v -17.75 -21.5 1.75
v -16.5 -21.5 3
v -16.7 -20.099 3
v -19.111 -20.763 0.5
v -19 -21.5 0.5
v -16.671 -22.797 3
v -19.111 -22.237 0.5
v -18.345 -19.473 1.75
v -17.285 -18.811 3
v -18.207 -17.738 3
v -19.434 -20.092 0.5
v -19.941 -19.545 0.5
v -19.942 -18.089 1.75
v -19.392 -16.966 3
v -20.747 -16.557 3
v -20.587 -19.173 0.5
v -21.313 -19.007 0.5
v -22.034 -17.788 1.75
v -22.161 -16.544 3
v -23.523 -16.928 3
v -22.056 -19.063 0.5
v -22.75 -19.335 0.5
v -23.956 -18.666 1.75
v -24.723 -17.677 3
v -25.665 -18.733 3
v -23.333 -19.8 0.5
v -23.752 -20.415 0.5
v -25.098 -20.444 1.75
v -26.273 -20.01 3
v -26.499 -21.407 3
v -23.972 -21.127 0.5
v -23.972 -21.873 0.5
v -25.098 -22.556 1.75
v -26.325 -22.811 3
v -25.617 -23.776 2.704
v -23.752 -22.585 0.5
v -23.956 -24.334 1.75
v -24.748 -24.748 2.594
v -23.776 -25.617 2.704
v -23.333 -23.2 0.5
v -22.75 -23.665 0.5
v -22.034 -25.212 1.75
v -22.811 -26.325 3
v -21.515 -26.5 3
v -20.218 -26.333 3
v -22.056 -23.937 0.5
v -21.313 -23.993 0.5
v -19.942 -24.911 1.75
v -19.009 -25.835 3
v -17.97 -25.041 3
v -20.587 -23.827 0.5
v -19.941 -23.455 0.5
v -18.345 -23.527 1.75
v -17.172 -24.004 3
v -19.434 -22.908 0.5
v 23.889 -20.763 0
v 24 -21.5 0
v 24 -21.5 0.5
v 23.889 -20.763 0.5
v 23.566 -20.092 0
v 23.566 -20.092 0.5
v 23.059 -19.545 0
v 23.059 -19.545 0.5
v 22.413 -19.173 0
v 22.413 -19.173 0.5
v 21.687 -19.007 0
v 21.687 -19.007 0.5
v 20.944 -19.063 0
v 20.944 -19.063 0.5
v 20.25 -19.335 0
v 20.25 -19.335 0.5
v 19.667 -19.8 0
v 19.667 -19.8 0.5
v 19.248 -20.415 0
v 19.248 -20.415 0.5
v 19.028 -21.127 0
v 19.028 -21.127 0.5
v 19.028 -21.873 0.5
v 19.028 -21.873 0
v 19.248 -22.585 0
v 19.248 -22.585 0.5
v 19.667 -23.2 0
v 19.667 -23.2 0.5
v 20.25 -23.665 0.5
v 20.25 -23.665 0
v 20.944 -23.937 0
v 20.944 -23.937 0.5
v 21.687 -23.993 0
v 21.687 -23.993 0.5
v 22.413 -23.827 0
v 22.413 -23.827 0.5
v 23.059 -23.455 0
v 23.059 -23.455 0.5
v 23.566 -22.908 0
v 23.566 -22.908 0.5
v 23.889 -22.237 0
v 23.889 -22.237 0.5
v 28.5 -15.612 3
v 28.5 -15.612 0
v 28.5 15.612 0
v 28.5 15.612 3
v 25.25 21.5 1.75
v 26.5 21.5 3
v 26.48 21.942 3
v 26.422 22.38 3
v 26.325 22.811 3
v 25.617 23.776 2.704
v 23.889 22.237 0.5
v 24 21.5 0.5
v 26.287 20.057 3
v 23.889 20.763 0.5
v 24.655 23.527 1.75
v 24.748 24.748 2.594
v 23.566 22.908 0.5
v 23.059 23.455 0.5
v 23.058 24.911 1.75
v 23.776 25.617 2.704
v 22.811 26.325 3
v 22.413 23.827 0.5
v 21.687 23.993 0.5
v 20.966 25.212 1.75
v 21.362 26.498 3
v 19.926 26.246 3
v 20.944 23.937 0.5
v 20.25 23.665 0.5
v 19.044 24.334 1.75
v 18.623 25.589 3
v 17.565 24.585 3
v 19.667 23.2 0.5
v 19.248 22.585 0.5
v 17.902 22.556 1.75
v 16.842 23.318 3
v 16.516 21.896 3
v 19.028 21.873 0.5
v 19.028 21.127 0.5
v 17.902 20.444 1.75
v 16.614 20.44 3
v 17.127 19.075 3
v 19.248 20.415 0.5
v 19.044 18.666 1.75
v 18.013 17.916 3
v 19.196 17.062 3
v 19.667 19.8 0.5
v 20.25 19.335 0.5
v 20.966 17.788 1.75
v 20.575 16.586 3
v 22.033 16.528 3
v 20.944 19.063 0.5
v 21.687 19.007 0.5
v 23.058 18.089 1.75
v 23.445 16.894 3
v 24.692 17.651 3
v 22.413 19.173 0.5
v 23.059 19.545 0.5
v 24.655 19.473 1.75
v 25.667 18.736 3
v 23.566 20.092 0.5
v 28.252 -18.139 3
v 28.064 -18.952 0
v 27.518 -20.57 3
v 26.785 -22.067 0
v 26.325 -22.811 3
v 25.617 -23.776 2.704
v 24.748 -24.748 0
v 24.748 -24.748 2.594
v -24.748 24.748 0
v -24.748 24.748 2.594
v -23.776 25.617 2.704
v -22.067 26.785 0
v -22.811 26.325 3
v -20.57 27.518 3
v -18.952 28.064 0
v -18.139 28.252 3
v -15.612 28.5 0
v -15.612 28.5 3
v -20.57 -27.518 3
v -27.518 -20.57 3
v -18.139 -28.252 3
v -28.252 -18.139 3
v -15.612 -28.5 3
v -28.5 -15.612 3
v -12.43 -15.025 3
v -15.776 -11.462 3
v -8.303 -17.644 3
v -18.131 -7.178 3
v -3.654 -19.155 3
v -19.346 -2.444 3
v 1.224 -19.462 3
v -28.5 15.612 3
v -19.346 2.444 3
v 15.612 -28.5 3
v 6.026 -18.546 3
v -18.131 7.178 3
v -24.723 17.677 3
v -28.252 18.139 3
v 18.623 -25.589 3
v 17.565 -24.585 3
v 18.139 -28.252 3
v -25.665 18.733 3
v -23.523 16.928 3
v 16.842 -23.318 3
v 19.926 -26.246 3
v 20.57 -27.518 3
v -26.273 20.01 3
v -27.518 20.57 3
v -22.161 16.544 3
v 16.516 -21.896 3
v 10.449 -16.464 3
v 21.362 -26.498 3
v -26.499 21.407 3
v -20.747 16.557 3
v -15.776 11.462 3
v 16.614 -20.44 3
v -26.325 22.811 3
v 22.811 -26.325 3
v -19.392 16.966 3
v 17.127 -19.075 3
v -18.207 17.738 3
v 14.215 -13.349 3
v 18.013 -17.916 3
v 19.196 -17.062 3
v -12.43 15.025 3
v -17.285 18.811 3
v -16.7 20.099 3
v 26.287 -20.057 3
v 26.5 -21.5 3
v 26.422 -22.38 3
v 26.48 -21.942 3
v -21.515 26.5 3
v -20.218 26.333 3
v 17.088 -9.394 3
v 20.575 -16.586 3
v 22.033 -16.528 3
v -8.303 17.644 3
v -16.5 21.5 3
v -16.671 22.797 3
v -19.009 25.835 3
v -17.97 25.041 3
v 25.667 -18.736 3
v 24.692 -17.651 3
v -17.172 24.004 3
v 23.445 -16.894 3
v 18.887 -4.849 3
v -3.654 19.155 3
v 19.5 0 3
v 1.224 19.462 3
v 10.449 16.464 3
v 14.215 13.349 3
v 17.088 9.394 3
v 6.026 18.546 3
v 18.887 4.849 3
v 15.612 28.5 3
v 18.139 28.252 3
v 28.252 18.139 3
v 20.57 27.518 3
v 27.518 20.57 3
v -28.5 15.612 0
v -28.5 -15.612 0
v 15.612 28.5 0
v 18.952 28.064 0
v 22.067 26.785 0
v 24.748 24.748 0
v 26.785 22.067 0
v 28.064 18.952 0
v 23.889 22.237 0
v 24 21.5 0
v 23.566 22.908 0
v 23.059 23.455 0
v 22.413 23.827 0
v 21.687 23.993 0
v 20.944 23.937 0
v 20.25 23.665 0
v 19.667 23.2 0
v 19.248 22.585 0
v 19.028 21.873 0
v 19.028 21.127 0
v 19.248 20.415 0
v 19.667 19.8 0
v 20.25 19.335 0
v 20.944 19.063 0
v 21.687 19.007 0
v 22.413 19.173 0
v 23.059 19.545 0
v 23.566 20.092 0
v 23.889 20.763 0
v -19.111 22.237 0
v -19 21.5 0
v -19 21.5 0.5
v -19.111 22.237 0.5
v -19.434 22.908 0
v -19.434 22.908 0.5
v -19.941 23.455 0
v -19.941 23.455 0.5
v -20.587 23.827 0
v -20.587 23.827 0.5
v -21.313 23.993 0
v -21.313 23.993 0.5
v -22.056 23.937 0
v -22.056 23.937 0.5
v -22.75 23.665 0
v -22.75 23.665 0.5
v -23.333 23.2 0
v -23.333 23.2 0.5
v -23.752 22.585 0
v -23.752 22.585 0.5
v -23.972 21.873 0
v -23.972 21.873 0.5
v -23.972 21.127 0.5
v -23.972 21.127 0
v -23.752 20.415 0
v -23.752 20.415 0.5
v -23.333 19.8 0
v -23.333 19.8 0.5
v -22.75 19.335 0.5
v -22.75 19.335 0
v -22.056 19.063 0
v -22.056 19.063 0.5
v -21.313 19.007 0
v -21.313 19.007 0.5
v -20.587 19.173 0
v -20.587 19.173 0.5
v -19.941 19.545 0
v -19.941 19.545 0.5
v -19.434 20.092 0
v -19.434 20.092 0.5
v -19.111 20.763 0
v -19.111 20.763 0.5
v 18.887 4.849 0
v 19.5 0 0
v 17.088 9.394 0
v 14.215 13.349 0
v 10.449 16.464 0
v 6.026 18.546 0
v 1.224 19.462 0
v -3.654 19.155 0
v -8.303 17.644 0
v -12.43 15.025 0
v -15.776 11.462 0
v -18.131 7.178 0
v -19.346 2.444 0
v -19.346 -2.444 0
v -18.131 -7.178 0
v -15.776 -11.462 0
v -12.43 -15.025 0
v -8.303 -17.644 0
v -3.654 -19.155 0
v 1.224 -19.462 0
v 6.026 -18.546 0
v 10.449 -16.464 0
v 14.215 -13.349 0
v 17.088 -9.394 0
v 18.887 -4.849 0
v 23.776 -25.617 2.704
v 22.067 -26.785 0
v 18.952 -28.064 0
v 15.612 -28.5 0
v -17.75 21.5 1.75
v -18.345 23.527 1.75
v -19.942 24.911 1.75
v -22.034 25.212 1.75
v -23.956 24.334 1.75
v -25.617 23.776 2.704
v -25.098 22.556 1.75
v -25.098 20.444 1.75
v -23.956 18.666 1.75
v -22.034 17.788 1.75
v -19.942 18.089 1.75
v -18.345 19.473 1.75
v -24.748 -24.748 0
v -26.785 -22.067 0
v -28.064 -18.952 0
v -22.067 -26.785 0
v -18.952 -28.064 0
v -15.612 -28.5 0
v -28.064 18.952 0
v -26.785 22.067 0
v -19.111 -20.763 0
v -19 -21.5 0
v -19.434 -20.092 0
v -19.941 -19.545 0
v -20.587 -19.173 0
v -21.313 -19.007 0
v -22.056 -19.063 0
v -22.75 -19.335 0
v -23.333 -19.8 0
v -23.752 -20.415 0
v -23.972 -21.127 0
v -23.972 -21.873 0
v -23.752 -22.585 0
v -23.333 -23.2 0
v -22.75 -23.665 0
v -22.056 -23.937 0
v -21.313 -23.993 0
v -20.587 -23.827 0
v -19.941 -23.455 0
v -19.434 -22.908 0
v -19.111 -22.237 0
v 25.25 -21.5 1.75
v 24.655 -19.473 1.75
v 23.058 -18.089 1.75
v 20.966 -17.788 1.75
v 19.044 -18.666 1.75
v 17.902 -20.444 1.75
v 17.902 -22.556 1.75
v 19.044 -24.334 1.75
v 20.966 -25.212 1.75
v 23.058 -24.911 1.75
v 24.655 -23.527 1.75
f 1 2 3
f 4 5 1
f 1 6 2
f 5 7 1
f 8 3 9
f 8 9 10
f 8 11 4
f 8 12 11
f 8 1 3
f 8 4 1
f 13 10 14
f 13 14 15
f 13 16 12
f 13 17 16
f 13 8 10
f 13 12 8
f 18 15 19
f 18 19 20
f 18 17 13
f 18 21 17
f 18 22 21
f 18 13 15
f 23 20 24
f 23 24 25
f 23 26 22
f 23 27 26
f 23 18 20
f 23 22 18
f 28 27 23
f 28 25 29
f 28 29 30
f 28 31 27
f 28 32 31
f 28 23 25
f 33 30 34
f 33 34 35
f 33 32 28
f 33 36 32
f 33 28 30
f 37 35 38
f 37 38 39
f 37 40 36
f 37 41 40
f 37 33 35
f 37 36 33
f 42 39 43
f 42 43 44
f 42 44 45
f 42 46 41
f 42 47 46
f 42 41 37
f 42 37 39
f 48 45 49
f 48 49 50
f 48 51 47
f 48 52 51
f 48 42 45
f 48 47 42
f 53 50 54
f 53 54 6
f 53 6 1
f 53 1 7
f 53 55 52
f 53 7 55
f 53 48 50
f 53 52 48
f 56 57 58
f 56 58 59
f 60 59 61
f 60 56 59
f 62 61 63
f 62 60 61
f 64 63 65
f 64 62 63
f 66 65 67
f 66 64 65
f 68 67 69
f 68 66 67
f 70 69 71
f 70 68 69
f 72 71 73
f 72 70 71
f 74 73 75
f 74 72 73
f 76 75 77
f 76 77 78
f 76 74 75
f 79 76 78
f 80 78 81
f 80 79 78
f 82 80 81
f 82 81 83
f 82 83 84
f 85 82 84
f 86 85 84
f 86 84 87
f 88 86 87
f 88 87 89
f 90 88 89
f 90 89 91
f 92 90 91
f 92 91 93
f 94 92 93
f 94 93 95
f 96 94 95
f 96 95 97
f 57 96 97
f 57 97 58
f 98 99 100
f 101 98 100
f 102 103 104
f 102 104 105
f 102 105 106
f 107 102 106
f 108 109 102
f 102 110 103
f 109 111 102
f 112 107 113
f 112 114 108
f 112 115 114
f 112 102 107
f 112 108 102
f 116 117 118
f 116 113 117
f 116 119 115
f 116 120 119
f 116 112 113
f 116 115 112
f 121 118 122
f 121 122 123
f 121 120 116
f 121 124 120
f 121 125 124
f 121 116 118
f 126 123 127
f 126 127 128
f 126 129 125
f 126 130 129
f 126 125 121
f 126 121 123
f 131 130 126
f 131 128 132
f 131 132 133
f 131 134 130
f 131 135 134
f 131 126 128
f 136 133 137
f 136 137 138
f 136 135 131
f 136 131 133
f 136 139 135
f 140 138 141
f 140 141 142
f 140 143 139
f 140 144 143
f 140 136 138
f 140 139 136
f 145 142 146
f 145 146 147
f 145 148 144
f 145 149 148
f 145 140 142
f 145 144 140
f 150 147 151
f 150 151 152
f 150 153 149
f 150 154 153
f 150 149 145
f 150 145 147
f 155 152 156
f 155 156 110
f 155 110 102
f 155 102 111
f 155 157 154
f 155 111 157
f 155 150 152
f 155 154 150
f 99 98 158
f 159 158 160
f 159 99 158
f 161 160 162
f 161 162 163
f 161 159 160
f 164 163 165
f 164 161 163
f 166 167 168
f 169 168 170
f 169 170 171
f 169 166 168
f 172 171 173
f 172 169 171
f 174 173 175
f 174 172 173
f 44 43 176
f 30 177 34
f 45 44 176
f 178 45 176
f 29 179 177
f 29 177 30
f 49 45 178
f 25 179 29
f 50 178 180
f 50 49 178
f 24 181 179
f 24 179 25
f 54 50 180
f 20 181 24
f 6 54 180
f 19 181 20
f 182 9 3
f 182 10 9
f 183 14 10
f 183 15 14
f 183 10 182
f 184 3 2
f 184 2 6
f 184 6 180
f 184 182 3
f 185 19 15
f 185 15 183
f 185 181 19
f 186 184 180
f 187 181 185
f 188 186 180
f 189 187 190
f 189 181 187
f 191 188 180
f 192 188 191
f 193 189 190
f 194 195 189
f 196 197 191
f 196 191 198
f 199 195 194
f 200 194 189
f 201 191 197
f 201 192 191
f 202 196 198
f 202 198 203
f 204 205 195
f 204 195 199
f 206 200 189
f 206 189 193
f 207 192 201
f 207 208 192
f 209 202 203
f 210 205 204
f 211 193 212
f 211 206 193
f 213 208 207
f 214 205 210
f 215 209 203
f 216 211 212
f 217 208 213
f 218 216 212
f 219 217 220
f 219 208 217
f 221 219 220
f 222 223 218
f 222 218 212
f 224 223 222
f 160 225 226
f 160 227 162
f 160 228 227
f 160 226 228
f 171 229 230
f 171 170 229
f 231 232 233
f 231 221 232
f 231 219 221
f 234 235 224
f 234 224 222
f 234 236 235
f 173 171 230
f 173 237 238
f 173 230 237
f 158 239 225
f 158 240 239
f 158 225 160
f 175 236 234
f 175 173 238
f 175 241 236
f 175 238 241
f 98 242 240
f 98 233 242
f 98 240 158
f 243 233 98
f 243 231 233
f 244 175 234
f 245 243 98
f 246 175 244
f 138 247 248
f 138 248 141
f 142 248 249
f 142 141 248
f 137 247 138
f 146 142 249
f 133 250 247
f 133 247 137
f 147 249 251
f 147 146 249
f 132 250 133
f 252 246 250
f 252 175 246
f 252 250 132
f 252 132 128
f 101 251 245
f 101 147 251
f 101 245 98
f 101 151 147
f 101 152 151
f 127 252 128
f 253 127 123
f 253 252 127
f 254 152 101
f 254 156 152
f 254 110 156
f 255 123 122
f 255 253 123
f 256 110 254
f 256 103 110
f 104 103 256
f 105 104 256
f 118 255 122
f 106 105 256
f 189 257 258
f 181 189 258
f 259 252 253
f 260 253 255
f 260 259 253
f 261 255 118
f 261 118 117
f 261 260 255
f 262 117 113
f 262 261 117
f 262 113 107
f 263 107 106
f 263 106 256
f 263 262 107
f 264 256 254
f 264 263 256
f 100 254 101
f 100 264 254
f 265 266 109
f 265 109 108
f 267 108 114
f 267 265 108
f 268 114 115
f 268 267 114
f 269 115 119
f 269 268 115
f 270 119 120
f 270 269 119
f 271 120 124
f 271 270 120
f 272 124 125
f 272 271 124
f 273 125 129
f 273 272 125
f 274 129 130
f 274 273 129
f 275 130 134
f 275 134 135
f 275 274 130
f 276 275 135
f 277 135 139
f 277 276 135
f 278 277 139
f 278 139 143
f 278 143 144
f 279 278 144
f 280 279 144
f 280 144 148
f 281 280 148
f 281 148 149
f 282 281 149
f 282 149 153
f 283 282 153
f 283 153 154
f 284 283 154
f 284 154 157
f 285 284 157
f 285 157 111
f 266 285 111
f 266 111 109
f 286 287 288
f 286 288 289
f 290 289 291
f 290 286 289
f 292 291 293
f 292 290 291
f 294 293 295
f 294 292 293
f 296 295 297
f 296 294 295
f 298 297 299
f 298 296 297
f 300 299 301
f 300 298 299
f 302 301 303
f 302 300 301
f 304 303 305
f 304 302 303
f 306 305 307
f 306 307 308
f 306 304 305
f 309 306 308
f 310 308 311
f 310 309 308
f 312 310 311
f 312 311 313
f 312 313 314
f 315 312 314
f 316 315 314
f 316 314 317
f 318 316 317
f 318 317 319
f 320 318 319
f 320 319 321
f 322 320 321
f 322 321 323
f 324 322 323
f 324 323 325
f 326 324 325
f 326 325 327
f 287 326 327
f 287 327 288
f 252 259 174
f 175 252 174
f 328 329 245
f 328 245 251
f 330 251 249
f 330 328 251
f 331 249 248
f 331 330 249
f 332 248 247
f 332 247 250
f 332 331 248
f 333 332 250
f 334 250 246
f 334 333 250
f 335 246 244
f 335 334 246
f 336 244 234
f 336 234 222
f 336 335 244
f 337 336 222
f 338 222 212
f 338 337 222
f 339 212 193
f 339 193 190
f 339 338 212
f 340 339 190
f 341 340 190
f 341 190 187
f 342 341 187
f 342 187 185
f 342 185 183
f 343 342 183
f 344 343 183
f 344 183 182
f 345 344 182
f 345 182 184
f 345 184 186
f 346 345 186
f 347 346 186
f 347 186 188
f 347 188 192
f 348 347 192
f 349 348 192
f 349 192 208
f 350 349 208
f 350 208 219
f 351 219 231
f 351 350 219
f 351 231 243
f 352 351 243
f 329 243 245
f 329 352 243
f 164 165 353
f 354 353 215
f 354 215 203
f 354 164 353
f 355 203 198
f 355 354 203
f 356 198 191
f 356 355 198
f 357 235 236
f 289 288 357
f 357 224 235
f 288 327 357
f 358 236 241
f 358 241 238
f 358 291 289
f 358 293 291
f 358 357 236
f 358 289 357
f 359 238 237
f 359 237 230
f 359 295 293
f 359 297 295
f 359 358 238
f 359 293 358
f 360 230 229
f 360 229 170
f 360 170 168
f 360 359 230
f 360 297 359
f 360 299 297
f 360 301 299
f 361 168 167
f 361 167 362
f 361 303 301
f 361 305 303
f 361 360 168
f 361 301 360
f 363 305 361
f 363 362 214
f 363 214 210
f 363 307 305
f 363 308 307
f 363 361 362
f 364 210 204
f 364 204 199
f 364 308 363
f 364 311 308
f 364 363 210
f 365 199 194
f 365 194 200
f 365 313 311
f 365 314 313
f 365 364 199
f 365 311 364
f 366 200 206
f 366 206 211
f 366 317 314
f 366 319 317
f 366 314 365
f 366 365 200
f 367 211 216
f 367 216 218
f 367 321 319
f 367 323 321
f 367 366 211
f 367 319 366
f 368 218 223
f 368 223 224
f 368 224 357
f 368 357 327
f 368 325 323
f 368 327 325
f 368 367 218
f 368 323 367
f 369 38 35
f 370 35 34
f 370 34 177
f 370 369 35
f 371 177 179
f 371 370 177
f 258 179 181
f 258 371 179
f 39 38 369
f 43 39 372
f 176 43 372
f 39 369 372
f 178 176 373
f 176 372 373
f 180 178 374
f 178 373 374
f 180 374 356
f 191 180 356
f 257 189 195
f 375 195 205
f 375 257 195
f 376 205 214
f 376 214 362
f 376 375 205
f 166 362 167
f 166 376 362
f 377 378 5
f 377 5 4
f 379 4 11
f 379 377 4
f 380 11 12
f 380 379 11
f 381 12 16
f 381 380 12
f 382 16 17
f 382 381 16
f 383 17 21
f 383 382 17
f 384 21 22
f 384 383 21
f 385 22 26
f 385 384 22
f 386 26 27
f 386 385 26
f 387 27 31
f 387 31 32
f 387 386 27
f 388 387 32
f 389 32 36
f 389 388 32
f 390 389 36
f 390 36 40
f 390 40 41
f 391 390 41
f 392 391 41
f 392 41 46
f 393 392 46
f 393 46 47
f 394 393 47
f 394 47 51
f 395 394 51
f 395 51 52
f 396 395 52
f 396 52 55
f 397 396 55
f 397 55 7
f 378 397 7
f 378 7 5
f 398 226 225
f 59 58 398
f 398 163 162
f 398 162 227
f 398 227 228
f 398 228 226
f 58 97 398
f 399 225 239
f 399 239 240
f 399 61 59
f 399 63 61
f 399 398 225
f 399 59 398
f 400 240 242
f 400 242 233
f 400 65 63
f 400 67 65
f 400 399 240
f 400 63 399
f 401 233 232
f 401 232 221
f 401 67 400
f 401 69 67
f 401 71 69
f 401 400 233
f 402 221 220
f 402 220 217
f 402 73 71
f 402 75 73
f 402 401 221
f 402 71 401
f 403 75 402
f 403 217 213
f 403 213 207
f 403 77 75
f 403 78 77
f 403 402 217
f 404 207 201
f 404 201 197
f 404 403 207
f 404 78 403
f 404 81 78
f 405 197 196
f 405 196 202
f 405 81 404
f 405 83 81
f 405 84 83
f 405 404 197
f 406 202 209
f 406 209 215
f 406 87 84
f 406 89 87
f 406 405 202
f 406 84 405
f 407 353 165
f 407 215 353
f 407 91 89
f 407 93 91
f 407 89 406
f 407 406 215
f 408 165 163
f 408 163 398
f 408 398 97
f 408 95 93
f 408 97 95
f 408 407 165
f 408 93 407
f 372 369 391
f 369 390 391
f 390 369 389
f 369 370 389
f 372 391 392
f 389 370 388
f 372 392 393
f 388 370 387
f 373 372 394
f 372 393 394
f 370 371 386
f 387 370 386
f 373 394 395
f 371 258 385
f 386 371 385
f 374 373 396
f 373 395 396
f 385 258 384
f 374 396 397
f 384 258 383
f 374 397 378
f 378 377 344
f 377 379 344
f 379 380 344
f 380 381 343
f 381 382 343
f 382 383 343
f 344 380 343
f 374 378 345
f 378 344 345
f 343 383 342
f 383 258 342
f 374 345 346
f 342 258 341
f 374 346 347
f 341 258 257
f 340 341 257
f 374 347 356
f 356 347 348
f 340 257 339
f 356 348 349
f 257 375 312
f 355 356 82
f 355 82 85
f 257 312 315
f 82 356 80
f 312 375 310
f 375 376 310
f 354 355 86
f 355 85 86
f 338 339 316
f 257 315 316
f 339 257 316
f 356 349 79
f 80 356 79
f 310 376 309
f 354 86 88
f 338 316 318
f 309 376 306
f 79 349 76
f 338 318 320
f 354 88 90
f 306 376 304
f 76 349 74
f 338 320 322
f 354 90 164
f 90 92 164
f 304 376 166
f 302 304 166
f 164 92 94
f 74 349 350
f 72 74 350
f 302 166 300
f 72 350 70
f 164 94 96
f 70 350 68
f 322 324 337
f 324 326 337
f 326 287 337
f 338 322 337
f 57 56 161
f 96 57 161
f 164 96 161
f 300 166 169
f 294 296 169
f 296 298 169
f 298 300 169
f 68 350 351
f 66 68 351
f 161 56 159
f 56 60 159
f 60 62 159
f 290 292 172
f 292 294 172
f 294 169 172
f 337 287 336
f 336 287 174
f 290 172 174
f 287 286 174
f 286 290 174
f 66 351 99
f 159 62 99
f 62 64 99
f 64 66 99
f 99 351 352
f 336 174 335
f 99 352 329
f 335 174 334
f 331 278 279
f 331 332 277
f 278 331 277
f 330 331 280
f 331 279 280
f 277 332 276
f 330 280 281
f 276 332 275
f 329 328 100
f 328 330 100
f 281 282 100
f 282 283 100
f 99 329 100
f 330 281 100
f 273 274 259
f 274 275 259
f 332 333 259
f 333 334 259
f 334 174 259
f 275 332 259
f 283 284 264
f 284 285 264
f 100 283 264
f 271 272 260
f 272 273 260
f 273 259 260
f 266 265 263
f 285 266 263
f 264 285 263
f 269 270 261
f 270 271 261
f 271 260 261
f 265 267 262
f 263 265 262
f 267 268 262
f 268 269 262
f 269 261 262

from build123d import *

# Parameters (mm, degrees)
F0_R        = 2.5
F0_R_2      = 23.5
F0_R_3      = 19.5
F1_DEPTH    = 3
F2_DEPTH    = 2.5
F3_T1_DEPTH = 32.6645215065


# Not quite as in the source:
# - a fillet or chamfer that OpenCascade refuses, or shapes differently, is made with other operations: its cross-section is extruded or revolved along the edge and cut away or added


with BuildPart() as f1:
    # F0 (on Top) → F1 (new body)
    with BuildSketch(Plane.XY):
        with BuildLine():
            Line((-20.3162496539, -28.5), (20.3162496539, -28.5))
            ThreePointArc((20.3162496539, -28.5), (24.7487373415, -24.7487373415), (28.5, -20.3162496539))
            Line((28.5, -20.3162496539), (28.5, 20.3162496539))
            ThreePointArc((28.5, 20.3162496539), (24.7487373415, 24.7487373415), (20.3162496539, 28.5))
            Line((20.3162496539, 28.5), (-20.3162496539, 28.5))
            ThreePointArc((-20.3162496539, 28.5), (-24.7487373415, 24.7487373415), (-28.5, 20.3162496539))
            Line((-28.5, 20.3162496539), (-28.5, -20.3162496539))
            ThreePointArc((-28.5, -20.3162496539), (-24.7487373415, -24.7487373415), (-20.3162496539, -28.5))
        make_face()
        with Locations((-21.5, -21.5)):
            Circle(F0_R, mode=Mode.SUBTRACT)
        with Locations((21.5, -21.5)):
            Circle(F0_R, mode=Mode.SUBTRACT)
        with Locations((-21.5, 21.5)):
            Circle(F0_R, mode=Mode.SUBTRACT)
        Circle(F0_R_2, mode=Mode.SUBTRACT)
        with Locations((21.5, 21.5)):
            Circle(F0_R, mode=Mode.SUBTRACT)
        Circle(F0_R_2)
        Circle(F0_R_3, mode=Mode.SUBTRACT)
    extrude(amount=F1_DEPTH)

    # F0 (on Top) → F2 (join)
    with BuildSketch(Plane.XY):
        Circle(F0_R_2)
        Circle(F0_R_3, mode=Mode.SUBTRACT)
    extrude(amount=F2_DEPTH)

    # F3: fillet of radius 13 on 8 edges, made by hand

    # F3_s2 → F3_t1 (cut)
    with BuildSketch(Plane.XY.offset(-14.8322607533)):
        with BuildLine():
            ThreePointArc((-28.5, 15.612494996), (-27.5014203705, 20.6090847421), (-24.6590909091, 24.8380602209))
            ThreePointArc((-24.6590909091, 24.8380602209), (-26.675530534, 22.6586864299), (-28.5, 20.3162496539))
            Line((-28.5, 20.3162496539), (-28.5, 15.612494996))
        make_face()
        with BuildLine():
            ThreePointArc((-24.8380602209, 24.6590909091), (-20.6090847421, 27.5014203705), (-15.612494996, 28.5))
            Line((-15.612494996, 28.5), (-20.3162496539, 28.5))
            ThreePointArc((-20.3162496539, 28.5), (-22.6586864299, 26.675530534), (-24.8380602209, 24.6590909091))
        make_face()
        with BuildLine():
            ThreePointArc((15.612494996, 28.5), (20.6090847421, 27.5014203705), (24.8380602209, 24.6590909091))
            ThreePointArc((24.8380602209, 24.6590909091), (22.6586864299, 26.675530534), (20.3162496539, 28.5))
            Line((20.3162496539, 28.5), (15.612494996, 28.5))
        make_face()
        with BuildLine():
            ThreePointArc((24.6590909091, 24.8380602209), (27.5014203705, 20.6090847421), (28.5, 15.612494996))
            Line((28.5, 15.612494996), (28.5, 20.3162496539))
            ThreePointArc((28.5, 20.3162496539), (26.675530534, 22.6586864299), (24.6590909091, 24.8380602209))
        make_face()
        with BuildLine():
            ThreePointArc((28.5, -15.612494996), (27.5014203705, -20.6090847421), (24.6590909091, -24.8380602209))
            ThreePointArc((24.6590909091, -24.8380602209), (26.675530534, -22.6586864299), (28.5, -20.3162496539))
            Line((28.5, -20.3162496539), (28.5, -15.612494996))
        make_face()
        with BuildLine():
            ThreePointArc((24.8380602209, -24.6590909091), (20.6090847421, -27.5014203705), (15.612494996, -28.5))
            Line((15.612494996, -28.5), (20.3162496539, -28.5))
            ThreePointArc((20.3162496539, -28.5), (22.6586864299, -26.675530534), (24.8380602209, -24.6590909091))
        make_face()
        with BuildLine():
            ThreePointArc((-24.8380602209, -24.6590909091), (-20.6090847421, -27.5014203705), (-15.612494996, -28.5))
            Line((-15.612494996, -28.5), (-20.3162496539, -28.5))
            ThreePointArc((-20.3162496539, -28.5), (-22.6586864299, -26.675530534), (-24.8380602209, -24.6590909091))
        make_face()
        with BuildLine():
            ThreePointArc((-24.6590909091, -24.8380602209), (-27.5014203705, -20.6090847421), (-28.5, -15.612494996))
            Line((-28.5, -15.612494996), (-28.5, -20.3162496539))
            ThreePointArc((-28.5, -20.3162496539), (-26.675530534, -22.6586864299), (-24.6590909091, -24.8380602209))
        make_face()
    extrude(amount=F3_T1_DEPTH, mode=Mode.SUBTRACT)

    # F4: chamfer of 2.5 on 4 edges, made by hand

    # F4_s1 → F4_t2 (revolve, cut)
    with BuildSketch(Plane.XZ.offset(-21.5)):
        Polygon((-16.5, 3), (-19, 0.5), (-19, 3), align=None)
    revolve(axis=Axis((-21.5, 21.5, 3), (0, 0, 1)), mode=Mode.SUBTRACT)

    # F4_s3 → F4_t4 (revolve, cut)
    with BuildSketch(Plane.XZ.offset(-21.5)):
        Polygon((26.5, 3), (24, 0.5), (24, 3), align=None)
    revolve(axis=Axis((21.5, 21.5, 3), (0, 0, 1)), mode=Mode.SUBTRACT)

    # F4_s5 → F4_t6 (revolve, cut)
    with BuildSketch(Plane.XZ.offset(21.5)):
        Polygon((26.5, 3), (24, 0.5), (24, 3), align=None)
    revolve(axis=Axis((21.5, -21.5, 3), (0, 0, 1)), mode=Mode.SUBTRACT)

    # F4_s7 → F4_t8 (revolve, cut)
    with BuildSketch(Plane.XZ.offset(21.5)):
        Polygon((-16.5, 3), (-19, 0.5), (-19, 3), align=None)
    revolve(axis=Axis((-21.5, -21.5, 3), (0, 0, 1)), mode=Mode.SUBTRACT)


solid = f1.part
